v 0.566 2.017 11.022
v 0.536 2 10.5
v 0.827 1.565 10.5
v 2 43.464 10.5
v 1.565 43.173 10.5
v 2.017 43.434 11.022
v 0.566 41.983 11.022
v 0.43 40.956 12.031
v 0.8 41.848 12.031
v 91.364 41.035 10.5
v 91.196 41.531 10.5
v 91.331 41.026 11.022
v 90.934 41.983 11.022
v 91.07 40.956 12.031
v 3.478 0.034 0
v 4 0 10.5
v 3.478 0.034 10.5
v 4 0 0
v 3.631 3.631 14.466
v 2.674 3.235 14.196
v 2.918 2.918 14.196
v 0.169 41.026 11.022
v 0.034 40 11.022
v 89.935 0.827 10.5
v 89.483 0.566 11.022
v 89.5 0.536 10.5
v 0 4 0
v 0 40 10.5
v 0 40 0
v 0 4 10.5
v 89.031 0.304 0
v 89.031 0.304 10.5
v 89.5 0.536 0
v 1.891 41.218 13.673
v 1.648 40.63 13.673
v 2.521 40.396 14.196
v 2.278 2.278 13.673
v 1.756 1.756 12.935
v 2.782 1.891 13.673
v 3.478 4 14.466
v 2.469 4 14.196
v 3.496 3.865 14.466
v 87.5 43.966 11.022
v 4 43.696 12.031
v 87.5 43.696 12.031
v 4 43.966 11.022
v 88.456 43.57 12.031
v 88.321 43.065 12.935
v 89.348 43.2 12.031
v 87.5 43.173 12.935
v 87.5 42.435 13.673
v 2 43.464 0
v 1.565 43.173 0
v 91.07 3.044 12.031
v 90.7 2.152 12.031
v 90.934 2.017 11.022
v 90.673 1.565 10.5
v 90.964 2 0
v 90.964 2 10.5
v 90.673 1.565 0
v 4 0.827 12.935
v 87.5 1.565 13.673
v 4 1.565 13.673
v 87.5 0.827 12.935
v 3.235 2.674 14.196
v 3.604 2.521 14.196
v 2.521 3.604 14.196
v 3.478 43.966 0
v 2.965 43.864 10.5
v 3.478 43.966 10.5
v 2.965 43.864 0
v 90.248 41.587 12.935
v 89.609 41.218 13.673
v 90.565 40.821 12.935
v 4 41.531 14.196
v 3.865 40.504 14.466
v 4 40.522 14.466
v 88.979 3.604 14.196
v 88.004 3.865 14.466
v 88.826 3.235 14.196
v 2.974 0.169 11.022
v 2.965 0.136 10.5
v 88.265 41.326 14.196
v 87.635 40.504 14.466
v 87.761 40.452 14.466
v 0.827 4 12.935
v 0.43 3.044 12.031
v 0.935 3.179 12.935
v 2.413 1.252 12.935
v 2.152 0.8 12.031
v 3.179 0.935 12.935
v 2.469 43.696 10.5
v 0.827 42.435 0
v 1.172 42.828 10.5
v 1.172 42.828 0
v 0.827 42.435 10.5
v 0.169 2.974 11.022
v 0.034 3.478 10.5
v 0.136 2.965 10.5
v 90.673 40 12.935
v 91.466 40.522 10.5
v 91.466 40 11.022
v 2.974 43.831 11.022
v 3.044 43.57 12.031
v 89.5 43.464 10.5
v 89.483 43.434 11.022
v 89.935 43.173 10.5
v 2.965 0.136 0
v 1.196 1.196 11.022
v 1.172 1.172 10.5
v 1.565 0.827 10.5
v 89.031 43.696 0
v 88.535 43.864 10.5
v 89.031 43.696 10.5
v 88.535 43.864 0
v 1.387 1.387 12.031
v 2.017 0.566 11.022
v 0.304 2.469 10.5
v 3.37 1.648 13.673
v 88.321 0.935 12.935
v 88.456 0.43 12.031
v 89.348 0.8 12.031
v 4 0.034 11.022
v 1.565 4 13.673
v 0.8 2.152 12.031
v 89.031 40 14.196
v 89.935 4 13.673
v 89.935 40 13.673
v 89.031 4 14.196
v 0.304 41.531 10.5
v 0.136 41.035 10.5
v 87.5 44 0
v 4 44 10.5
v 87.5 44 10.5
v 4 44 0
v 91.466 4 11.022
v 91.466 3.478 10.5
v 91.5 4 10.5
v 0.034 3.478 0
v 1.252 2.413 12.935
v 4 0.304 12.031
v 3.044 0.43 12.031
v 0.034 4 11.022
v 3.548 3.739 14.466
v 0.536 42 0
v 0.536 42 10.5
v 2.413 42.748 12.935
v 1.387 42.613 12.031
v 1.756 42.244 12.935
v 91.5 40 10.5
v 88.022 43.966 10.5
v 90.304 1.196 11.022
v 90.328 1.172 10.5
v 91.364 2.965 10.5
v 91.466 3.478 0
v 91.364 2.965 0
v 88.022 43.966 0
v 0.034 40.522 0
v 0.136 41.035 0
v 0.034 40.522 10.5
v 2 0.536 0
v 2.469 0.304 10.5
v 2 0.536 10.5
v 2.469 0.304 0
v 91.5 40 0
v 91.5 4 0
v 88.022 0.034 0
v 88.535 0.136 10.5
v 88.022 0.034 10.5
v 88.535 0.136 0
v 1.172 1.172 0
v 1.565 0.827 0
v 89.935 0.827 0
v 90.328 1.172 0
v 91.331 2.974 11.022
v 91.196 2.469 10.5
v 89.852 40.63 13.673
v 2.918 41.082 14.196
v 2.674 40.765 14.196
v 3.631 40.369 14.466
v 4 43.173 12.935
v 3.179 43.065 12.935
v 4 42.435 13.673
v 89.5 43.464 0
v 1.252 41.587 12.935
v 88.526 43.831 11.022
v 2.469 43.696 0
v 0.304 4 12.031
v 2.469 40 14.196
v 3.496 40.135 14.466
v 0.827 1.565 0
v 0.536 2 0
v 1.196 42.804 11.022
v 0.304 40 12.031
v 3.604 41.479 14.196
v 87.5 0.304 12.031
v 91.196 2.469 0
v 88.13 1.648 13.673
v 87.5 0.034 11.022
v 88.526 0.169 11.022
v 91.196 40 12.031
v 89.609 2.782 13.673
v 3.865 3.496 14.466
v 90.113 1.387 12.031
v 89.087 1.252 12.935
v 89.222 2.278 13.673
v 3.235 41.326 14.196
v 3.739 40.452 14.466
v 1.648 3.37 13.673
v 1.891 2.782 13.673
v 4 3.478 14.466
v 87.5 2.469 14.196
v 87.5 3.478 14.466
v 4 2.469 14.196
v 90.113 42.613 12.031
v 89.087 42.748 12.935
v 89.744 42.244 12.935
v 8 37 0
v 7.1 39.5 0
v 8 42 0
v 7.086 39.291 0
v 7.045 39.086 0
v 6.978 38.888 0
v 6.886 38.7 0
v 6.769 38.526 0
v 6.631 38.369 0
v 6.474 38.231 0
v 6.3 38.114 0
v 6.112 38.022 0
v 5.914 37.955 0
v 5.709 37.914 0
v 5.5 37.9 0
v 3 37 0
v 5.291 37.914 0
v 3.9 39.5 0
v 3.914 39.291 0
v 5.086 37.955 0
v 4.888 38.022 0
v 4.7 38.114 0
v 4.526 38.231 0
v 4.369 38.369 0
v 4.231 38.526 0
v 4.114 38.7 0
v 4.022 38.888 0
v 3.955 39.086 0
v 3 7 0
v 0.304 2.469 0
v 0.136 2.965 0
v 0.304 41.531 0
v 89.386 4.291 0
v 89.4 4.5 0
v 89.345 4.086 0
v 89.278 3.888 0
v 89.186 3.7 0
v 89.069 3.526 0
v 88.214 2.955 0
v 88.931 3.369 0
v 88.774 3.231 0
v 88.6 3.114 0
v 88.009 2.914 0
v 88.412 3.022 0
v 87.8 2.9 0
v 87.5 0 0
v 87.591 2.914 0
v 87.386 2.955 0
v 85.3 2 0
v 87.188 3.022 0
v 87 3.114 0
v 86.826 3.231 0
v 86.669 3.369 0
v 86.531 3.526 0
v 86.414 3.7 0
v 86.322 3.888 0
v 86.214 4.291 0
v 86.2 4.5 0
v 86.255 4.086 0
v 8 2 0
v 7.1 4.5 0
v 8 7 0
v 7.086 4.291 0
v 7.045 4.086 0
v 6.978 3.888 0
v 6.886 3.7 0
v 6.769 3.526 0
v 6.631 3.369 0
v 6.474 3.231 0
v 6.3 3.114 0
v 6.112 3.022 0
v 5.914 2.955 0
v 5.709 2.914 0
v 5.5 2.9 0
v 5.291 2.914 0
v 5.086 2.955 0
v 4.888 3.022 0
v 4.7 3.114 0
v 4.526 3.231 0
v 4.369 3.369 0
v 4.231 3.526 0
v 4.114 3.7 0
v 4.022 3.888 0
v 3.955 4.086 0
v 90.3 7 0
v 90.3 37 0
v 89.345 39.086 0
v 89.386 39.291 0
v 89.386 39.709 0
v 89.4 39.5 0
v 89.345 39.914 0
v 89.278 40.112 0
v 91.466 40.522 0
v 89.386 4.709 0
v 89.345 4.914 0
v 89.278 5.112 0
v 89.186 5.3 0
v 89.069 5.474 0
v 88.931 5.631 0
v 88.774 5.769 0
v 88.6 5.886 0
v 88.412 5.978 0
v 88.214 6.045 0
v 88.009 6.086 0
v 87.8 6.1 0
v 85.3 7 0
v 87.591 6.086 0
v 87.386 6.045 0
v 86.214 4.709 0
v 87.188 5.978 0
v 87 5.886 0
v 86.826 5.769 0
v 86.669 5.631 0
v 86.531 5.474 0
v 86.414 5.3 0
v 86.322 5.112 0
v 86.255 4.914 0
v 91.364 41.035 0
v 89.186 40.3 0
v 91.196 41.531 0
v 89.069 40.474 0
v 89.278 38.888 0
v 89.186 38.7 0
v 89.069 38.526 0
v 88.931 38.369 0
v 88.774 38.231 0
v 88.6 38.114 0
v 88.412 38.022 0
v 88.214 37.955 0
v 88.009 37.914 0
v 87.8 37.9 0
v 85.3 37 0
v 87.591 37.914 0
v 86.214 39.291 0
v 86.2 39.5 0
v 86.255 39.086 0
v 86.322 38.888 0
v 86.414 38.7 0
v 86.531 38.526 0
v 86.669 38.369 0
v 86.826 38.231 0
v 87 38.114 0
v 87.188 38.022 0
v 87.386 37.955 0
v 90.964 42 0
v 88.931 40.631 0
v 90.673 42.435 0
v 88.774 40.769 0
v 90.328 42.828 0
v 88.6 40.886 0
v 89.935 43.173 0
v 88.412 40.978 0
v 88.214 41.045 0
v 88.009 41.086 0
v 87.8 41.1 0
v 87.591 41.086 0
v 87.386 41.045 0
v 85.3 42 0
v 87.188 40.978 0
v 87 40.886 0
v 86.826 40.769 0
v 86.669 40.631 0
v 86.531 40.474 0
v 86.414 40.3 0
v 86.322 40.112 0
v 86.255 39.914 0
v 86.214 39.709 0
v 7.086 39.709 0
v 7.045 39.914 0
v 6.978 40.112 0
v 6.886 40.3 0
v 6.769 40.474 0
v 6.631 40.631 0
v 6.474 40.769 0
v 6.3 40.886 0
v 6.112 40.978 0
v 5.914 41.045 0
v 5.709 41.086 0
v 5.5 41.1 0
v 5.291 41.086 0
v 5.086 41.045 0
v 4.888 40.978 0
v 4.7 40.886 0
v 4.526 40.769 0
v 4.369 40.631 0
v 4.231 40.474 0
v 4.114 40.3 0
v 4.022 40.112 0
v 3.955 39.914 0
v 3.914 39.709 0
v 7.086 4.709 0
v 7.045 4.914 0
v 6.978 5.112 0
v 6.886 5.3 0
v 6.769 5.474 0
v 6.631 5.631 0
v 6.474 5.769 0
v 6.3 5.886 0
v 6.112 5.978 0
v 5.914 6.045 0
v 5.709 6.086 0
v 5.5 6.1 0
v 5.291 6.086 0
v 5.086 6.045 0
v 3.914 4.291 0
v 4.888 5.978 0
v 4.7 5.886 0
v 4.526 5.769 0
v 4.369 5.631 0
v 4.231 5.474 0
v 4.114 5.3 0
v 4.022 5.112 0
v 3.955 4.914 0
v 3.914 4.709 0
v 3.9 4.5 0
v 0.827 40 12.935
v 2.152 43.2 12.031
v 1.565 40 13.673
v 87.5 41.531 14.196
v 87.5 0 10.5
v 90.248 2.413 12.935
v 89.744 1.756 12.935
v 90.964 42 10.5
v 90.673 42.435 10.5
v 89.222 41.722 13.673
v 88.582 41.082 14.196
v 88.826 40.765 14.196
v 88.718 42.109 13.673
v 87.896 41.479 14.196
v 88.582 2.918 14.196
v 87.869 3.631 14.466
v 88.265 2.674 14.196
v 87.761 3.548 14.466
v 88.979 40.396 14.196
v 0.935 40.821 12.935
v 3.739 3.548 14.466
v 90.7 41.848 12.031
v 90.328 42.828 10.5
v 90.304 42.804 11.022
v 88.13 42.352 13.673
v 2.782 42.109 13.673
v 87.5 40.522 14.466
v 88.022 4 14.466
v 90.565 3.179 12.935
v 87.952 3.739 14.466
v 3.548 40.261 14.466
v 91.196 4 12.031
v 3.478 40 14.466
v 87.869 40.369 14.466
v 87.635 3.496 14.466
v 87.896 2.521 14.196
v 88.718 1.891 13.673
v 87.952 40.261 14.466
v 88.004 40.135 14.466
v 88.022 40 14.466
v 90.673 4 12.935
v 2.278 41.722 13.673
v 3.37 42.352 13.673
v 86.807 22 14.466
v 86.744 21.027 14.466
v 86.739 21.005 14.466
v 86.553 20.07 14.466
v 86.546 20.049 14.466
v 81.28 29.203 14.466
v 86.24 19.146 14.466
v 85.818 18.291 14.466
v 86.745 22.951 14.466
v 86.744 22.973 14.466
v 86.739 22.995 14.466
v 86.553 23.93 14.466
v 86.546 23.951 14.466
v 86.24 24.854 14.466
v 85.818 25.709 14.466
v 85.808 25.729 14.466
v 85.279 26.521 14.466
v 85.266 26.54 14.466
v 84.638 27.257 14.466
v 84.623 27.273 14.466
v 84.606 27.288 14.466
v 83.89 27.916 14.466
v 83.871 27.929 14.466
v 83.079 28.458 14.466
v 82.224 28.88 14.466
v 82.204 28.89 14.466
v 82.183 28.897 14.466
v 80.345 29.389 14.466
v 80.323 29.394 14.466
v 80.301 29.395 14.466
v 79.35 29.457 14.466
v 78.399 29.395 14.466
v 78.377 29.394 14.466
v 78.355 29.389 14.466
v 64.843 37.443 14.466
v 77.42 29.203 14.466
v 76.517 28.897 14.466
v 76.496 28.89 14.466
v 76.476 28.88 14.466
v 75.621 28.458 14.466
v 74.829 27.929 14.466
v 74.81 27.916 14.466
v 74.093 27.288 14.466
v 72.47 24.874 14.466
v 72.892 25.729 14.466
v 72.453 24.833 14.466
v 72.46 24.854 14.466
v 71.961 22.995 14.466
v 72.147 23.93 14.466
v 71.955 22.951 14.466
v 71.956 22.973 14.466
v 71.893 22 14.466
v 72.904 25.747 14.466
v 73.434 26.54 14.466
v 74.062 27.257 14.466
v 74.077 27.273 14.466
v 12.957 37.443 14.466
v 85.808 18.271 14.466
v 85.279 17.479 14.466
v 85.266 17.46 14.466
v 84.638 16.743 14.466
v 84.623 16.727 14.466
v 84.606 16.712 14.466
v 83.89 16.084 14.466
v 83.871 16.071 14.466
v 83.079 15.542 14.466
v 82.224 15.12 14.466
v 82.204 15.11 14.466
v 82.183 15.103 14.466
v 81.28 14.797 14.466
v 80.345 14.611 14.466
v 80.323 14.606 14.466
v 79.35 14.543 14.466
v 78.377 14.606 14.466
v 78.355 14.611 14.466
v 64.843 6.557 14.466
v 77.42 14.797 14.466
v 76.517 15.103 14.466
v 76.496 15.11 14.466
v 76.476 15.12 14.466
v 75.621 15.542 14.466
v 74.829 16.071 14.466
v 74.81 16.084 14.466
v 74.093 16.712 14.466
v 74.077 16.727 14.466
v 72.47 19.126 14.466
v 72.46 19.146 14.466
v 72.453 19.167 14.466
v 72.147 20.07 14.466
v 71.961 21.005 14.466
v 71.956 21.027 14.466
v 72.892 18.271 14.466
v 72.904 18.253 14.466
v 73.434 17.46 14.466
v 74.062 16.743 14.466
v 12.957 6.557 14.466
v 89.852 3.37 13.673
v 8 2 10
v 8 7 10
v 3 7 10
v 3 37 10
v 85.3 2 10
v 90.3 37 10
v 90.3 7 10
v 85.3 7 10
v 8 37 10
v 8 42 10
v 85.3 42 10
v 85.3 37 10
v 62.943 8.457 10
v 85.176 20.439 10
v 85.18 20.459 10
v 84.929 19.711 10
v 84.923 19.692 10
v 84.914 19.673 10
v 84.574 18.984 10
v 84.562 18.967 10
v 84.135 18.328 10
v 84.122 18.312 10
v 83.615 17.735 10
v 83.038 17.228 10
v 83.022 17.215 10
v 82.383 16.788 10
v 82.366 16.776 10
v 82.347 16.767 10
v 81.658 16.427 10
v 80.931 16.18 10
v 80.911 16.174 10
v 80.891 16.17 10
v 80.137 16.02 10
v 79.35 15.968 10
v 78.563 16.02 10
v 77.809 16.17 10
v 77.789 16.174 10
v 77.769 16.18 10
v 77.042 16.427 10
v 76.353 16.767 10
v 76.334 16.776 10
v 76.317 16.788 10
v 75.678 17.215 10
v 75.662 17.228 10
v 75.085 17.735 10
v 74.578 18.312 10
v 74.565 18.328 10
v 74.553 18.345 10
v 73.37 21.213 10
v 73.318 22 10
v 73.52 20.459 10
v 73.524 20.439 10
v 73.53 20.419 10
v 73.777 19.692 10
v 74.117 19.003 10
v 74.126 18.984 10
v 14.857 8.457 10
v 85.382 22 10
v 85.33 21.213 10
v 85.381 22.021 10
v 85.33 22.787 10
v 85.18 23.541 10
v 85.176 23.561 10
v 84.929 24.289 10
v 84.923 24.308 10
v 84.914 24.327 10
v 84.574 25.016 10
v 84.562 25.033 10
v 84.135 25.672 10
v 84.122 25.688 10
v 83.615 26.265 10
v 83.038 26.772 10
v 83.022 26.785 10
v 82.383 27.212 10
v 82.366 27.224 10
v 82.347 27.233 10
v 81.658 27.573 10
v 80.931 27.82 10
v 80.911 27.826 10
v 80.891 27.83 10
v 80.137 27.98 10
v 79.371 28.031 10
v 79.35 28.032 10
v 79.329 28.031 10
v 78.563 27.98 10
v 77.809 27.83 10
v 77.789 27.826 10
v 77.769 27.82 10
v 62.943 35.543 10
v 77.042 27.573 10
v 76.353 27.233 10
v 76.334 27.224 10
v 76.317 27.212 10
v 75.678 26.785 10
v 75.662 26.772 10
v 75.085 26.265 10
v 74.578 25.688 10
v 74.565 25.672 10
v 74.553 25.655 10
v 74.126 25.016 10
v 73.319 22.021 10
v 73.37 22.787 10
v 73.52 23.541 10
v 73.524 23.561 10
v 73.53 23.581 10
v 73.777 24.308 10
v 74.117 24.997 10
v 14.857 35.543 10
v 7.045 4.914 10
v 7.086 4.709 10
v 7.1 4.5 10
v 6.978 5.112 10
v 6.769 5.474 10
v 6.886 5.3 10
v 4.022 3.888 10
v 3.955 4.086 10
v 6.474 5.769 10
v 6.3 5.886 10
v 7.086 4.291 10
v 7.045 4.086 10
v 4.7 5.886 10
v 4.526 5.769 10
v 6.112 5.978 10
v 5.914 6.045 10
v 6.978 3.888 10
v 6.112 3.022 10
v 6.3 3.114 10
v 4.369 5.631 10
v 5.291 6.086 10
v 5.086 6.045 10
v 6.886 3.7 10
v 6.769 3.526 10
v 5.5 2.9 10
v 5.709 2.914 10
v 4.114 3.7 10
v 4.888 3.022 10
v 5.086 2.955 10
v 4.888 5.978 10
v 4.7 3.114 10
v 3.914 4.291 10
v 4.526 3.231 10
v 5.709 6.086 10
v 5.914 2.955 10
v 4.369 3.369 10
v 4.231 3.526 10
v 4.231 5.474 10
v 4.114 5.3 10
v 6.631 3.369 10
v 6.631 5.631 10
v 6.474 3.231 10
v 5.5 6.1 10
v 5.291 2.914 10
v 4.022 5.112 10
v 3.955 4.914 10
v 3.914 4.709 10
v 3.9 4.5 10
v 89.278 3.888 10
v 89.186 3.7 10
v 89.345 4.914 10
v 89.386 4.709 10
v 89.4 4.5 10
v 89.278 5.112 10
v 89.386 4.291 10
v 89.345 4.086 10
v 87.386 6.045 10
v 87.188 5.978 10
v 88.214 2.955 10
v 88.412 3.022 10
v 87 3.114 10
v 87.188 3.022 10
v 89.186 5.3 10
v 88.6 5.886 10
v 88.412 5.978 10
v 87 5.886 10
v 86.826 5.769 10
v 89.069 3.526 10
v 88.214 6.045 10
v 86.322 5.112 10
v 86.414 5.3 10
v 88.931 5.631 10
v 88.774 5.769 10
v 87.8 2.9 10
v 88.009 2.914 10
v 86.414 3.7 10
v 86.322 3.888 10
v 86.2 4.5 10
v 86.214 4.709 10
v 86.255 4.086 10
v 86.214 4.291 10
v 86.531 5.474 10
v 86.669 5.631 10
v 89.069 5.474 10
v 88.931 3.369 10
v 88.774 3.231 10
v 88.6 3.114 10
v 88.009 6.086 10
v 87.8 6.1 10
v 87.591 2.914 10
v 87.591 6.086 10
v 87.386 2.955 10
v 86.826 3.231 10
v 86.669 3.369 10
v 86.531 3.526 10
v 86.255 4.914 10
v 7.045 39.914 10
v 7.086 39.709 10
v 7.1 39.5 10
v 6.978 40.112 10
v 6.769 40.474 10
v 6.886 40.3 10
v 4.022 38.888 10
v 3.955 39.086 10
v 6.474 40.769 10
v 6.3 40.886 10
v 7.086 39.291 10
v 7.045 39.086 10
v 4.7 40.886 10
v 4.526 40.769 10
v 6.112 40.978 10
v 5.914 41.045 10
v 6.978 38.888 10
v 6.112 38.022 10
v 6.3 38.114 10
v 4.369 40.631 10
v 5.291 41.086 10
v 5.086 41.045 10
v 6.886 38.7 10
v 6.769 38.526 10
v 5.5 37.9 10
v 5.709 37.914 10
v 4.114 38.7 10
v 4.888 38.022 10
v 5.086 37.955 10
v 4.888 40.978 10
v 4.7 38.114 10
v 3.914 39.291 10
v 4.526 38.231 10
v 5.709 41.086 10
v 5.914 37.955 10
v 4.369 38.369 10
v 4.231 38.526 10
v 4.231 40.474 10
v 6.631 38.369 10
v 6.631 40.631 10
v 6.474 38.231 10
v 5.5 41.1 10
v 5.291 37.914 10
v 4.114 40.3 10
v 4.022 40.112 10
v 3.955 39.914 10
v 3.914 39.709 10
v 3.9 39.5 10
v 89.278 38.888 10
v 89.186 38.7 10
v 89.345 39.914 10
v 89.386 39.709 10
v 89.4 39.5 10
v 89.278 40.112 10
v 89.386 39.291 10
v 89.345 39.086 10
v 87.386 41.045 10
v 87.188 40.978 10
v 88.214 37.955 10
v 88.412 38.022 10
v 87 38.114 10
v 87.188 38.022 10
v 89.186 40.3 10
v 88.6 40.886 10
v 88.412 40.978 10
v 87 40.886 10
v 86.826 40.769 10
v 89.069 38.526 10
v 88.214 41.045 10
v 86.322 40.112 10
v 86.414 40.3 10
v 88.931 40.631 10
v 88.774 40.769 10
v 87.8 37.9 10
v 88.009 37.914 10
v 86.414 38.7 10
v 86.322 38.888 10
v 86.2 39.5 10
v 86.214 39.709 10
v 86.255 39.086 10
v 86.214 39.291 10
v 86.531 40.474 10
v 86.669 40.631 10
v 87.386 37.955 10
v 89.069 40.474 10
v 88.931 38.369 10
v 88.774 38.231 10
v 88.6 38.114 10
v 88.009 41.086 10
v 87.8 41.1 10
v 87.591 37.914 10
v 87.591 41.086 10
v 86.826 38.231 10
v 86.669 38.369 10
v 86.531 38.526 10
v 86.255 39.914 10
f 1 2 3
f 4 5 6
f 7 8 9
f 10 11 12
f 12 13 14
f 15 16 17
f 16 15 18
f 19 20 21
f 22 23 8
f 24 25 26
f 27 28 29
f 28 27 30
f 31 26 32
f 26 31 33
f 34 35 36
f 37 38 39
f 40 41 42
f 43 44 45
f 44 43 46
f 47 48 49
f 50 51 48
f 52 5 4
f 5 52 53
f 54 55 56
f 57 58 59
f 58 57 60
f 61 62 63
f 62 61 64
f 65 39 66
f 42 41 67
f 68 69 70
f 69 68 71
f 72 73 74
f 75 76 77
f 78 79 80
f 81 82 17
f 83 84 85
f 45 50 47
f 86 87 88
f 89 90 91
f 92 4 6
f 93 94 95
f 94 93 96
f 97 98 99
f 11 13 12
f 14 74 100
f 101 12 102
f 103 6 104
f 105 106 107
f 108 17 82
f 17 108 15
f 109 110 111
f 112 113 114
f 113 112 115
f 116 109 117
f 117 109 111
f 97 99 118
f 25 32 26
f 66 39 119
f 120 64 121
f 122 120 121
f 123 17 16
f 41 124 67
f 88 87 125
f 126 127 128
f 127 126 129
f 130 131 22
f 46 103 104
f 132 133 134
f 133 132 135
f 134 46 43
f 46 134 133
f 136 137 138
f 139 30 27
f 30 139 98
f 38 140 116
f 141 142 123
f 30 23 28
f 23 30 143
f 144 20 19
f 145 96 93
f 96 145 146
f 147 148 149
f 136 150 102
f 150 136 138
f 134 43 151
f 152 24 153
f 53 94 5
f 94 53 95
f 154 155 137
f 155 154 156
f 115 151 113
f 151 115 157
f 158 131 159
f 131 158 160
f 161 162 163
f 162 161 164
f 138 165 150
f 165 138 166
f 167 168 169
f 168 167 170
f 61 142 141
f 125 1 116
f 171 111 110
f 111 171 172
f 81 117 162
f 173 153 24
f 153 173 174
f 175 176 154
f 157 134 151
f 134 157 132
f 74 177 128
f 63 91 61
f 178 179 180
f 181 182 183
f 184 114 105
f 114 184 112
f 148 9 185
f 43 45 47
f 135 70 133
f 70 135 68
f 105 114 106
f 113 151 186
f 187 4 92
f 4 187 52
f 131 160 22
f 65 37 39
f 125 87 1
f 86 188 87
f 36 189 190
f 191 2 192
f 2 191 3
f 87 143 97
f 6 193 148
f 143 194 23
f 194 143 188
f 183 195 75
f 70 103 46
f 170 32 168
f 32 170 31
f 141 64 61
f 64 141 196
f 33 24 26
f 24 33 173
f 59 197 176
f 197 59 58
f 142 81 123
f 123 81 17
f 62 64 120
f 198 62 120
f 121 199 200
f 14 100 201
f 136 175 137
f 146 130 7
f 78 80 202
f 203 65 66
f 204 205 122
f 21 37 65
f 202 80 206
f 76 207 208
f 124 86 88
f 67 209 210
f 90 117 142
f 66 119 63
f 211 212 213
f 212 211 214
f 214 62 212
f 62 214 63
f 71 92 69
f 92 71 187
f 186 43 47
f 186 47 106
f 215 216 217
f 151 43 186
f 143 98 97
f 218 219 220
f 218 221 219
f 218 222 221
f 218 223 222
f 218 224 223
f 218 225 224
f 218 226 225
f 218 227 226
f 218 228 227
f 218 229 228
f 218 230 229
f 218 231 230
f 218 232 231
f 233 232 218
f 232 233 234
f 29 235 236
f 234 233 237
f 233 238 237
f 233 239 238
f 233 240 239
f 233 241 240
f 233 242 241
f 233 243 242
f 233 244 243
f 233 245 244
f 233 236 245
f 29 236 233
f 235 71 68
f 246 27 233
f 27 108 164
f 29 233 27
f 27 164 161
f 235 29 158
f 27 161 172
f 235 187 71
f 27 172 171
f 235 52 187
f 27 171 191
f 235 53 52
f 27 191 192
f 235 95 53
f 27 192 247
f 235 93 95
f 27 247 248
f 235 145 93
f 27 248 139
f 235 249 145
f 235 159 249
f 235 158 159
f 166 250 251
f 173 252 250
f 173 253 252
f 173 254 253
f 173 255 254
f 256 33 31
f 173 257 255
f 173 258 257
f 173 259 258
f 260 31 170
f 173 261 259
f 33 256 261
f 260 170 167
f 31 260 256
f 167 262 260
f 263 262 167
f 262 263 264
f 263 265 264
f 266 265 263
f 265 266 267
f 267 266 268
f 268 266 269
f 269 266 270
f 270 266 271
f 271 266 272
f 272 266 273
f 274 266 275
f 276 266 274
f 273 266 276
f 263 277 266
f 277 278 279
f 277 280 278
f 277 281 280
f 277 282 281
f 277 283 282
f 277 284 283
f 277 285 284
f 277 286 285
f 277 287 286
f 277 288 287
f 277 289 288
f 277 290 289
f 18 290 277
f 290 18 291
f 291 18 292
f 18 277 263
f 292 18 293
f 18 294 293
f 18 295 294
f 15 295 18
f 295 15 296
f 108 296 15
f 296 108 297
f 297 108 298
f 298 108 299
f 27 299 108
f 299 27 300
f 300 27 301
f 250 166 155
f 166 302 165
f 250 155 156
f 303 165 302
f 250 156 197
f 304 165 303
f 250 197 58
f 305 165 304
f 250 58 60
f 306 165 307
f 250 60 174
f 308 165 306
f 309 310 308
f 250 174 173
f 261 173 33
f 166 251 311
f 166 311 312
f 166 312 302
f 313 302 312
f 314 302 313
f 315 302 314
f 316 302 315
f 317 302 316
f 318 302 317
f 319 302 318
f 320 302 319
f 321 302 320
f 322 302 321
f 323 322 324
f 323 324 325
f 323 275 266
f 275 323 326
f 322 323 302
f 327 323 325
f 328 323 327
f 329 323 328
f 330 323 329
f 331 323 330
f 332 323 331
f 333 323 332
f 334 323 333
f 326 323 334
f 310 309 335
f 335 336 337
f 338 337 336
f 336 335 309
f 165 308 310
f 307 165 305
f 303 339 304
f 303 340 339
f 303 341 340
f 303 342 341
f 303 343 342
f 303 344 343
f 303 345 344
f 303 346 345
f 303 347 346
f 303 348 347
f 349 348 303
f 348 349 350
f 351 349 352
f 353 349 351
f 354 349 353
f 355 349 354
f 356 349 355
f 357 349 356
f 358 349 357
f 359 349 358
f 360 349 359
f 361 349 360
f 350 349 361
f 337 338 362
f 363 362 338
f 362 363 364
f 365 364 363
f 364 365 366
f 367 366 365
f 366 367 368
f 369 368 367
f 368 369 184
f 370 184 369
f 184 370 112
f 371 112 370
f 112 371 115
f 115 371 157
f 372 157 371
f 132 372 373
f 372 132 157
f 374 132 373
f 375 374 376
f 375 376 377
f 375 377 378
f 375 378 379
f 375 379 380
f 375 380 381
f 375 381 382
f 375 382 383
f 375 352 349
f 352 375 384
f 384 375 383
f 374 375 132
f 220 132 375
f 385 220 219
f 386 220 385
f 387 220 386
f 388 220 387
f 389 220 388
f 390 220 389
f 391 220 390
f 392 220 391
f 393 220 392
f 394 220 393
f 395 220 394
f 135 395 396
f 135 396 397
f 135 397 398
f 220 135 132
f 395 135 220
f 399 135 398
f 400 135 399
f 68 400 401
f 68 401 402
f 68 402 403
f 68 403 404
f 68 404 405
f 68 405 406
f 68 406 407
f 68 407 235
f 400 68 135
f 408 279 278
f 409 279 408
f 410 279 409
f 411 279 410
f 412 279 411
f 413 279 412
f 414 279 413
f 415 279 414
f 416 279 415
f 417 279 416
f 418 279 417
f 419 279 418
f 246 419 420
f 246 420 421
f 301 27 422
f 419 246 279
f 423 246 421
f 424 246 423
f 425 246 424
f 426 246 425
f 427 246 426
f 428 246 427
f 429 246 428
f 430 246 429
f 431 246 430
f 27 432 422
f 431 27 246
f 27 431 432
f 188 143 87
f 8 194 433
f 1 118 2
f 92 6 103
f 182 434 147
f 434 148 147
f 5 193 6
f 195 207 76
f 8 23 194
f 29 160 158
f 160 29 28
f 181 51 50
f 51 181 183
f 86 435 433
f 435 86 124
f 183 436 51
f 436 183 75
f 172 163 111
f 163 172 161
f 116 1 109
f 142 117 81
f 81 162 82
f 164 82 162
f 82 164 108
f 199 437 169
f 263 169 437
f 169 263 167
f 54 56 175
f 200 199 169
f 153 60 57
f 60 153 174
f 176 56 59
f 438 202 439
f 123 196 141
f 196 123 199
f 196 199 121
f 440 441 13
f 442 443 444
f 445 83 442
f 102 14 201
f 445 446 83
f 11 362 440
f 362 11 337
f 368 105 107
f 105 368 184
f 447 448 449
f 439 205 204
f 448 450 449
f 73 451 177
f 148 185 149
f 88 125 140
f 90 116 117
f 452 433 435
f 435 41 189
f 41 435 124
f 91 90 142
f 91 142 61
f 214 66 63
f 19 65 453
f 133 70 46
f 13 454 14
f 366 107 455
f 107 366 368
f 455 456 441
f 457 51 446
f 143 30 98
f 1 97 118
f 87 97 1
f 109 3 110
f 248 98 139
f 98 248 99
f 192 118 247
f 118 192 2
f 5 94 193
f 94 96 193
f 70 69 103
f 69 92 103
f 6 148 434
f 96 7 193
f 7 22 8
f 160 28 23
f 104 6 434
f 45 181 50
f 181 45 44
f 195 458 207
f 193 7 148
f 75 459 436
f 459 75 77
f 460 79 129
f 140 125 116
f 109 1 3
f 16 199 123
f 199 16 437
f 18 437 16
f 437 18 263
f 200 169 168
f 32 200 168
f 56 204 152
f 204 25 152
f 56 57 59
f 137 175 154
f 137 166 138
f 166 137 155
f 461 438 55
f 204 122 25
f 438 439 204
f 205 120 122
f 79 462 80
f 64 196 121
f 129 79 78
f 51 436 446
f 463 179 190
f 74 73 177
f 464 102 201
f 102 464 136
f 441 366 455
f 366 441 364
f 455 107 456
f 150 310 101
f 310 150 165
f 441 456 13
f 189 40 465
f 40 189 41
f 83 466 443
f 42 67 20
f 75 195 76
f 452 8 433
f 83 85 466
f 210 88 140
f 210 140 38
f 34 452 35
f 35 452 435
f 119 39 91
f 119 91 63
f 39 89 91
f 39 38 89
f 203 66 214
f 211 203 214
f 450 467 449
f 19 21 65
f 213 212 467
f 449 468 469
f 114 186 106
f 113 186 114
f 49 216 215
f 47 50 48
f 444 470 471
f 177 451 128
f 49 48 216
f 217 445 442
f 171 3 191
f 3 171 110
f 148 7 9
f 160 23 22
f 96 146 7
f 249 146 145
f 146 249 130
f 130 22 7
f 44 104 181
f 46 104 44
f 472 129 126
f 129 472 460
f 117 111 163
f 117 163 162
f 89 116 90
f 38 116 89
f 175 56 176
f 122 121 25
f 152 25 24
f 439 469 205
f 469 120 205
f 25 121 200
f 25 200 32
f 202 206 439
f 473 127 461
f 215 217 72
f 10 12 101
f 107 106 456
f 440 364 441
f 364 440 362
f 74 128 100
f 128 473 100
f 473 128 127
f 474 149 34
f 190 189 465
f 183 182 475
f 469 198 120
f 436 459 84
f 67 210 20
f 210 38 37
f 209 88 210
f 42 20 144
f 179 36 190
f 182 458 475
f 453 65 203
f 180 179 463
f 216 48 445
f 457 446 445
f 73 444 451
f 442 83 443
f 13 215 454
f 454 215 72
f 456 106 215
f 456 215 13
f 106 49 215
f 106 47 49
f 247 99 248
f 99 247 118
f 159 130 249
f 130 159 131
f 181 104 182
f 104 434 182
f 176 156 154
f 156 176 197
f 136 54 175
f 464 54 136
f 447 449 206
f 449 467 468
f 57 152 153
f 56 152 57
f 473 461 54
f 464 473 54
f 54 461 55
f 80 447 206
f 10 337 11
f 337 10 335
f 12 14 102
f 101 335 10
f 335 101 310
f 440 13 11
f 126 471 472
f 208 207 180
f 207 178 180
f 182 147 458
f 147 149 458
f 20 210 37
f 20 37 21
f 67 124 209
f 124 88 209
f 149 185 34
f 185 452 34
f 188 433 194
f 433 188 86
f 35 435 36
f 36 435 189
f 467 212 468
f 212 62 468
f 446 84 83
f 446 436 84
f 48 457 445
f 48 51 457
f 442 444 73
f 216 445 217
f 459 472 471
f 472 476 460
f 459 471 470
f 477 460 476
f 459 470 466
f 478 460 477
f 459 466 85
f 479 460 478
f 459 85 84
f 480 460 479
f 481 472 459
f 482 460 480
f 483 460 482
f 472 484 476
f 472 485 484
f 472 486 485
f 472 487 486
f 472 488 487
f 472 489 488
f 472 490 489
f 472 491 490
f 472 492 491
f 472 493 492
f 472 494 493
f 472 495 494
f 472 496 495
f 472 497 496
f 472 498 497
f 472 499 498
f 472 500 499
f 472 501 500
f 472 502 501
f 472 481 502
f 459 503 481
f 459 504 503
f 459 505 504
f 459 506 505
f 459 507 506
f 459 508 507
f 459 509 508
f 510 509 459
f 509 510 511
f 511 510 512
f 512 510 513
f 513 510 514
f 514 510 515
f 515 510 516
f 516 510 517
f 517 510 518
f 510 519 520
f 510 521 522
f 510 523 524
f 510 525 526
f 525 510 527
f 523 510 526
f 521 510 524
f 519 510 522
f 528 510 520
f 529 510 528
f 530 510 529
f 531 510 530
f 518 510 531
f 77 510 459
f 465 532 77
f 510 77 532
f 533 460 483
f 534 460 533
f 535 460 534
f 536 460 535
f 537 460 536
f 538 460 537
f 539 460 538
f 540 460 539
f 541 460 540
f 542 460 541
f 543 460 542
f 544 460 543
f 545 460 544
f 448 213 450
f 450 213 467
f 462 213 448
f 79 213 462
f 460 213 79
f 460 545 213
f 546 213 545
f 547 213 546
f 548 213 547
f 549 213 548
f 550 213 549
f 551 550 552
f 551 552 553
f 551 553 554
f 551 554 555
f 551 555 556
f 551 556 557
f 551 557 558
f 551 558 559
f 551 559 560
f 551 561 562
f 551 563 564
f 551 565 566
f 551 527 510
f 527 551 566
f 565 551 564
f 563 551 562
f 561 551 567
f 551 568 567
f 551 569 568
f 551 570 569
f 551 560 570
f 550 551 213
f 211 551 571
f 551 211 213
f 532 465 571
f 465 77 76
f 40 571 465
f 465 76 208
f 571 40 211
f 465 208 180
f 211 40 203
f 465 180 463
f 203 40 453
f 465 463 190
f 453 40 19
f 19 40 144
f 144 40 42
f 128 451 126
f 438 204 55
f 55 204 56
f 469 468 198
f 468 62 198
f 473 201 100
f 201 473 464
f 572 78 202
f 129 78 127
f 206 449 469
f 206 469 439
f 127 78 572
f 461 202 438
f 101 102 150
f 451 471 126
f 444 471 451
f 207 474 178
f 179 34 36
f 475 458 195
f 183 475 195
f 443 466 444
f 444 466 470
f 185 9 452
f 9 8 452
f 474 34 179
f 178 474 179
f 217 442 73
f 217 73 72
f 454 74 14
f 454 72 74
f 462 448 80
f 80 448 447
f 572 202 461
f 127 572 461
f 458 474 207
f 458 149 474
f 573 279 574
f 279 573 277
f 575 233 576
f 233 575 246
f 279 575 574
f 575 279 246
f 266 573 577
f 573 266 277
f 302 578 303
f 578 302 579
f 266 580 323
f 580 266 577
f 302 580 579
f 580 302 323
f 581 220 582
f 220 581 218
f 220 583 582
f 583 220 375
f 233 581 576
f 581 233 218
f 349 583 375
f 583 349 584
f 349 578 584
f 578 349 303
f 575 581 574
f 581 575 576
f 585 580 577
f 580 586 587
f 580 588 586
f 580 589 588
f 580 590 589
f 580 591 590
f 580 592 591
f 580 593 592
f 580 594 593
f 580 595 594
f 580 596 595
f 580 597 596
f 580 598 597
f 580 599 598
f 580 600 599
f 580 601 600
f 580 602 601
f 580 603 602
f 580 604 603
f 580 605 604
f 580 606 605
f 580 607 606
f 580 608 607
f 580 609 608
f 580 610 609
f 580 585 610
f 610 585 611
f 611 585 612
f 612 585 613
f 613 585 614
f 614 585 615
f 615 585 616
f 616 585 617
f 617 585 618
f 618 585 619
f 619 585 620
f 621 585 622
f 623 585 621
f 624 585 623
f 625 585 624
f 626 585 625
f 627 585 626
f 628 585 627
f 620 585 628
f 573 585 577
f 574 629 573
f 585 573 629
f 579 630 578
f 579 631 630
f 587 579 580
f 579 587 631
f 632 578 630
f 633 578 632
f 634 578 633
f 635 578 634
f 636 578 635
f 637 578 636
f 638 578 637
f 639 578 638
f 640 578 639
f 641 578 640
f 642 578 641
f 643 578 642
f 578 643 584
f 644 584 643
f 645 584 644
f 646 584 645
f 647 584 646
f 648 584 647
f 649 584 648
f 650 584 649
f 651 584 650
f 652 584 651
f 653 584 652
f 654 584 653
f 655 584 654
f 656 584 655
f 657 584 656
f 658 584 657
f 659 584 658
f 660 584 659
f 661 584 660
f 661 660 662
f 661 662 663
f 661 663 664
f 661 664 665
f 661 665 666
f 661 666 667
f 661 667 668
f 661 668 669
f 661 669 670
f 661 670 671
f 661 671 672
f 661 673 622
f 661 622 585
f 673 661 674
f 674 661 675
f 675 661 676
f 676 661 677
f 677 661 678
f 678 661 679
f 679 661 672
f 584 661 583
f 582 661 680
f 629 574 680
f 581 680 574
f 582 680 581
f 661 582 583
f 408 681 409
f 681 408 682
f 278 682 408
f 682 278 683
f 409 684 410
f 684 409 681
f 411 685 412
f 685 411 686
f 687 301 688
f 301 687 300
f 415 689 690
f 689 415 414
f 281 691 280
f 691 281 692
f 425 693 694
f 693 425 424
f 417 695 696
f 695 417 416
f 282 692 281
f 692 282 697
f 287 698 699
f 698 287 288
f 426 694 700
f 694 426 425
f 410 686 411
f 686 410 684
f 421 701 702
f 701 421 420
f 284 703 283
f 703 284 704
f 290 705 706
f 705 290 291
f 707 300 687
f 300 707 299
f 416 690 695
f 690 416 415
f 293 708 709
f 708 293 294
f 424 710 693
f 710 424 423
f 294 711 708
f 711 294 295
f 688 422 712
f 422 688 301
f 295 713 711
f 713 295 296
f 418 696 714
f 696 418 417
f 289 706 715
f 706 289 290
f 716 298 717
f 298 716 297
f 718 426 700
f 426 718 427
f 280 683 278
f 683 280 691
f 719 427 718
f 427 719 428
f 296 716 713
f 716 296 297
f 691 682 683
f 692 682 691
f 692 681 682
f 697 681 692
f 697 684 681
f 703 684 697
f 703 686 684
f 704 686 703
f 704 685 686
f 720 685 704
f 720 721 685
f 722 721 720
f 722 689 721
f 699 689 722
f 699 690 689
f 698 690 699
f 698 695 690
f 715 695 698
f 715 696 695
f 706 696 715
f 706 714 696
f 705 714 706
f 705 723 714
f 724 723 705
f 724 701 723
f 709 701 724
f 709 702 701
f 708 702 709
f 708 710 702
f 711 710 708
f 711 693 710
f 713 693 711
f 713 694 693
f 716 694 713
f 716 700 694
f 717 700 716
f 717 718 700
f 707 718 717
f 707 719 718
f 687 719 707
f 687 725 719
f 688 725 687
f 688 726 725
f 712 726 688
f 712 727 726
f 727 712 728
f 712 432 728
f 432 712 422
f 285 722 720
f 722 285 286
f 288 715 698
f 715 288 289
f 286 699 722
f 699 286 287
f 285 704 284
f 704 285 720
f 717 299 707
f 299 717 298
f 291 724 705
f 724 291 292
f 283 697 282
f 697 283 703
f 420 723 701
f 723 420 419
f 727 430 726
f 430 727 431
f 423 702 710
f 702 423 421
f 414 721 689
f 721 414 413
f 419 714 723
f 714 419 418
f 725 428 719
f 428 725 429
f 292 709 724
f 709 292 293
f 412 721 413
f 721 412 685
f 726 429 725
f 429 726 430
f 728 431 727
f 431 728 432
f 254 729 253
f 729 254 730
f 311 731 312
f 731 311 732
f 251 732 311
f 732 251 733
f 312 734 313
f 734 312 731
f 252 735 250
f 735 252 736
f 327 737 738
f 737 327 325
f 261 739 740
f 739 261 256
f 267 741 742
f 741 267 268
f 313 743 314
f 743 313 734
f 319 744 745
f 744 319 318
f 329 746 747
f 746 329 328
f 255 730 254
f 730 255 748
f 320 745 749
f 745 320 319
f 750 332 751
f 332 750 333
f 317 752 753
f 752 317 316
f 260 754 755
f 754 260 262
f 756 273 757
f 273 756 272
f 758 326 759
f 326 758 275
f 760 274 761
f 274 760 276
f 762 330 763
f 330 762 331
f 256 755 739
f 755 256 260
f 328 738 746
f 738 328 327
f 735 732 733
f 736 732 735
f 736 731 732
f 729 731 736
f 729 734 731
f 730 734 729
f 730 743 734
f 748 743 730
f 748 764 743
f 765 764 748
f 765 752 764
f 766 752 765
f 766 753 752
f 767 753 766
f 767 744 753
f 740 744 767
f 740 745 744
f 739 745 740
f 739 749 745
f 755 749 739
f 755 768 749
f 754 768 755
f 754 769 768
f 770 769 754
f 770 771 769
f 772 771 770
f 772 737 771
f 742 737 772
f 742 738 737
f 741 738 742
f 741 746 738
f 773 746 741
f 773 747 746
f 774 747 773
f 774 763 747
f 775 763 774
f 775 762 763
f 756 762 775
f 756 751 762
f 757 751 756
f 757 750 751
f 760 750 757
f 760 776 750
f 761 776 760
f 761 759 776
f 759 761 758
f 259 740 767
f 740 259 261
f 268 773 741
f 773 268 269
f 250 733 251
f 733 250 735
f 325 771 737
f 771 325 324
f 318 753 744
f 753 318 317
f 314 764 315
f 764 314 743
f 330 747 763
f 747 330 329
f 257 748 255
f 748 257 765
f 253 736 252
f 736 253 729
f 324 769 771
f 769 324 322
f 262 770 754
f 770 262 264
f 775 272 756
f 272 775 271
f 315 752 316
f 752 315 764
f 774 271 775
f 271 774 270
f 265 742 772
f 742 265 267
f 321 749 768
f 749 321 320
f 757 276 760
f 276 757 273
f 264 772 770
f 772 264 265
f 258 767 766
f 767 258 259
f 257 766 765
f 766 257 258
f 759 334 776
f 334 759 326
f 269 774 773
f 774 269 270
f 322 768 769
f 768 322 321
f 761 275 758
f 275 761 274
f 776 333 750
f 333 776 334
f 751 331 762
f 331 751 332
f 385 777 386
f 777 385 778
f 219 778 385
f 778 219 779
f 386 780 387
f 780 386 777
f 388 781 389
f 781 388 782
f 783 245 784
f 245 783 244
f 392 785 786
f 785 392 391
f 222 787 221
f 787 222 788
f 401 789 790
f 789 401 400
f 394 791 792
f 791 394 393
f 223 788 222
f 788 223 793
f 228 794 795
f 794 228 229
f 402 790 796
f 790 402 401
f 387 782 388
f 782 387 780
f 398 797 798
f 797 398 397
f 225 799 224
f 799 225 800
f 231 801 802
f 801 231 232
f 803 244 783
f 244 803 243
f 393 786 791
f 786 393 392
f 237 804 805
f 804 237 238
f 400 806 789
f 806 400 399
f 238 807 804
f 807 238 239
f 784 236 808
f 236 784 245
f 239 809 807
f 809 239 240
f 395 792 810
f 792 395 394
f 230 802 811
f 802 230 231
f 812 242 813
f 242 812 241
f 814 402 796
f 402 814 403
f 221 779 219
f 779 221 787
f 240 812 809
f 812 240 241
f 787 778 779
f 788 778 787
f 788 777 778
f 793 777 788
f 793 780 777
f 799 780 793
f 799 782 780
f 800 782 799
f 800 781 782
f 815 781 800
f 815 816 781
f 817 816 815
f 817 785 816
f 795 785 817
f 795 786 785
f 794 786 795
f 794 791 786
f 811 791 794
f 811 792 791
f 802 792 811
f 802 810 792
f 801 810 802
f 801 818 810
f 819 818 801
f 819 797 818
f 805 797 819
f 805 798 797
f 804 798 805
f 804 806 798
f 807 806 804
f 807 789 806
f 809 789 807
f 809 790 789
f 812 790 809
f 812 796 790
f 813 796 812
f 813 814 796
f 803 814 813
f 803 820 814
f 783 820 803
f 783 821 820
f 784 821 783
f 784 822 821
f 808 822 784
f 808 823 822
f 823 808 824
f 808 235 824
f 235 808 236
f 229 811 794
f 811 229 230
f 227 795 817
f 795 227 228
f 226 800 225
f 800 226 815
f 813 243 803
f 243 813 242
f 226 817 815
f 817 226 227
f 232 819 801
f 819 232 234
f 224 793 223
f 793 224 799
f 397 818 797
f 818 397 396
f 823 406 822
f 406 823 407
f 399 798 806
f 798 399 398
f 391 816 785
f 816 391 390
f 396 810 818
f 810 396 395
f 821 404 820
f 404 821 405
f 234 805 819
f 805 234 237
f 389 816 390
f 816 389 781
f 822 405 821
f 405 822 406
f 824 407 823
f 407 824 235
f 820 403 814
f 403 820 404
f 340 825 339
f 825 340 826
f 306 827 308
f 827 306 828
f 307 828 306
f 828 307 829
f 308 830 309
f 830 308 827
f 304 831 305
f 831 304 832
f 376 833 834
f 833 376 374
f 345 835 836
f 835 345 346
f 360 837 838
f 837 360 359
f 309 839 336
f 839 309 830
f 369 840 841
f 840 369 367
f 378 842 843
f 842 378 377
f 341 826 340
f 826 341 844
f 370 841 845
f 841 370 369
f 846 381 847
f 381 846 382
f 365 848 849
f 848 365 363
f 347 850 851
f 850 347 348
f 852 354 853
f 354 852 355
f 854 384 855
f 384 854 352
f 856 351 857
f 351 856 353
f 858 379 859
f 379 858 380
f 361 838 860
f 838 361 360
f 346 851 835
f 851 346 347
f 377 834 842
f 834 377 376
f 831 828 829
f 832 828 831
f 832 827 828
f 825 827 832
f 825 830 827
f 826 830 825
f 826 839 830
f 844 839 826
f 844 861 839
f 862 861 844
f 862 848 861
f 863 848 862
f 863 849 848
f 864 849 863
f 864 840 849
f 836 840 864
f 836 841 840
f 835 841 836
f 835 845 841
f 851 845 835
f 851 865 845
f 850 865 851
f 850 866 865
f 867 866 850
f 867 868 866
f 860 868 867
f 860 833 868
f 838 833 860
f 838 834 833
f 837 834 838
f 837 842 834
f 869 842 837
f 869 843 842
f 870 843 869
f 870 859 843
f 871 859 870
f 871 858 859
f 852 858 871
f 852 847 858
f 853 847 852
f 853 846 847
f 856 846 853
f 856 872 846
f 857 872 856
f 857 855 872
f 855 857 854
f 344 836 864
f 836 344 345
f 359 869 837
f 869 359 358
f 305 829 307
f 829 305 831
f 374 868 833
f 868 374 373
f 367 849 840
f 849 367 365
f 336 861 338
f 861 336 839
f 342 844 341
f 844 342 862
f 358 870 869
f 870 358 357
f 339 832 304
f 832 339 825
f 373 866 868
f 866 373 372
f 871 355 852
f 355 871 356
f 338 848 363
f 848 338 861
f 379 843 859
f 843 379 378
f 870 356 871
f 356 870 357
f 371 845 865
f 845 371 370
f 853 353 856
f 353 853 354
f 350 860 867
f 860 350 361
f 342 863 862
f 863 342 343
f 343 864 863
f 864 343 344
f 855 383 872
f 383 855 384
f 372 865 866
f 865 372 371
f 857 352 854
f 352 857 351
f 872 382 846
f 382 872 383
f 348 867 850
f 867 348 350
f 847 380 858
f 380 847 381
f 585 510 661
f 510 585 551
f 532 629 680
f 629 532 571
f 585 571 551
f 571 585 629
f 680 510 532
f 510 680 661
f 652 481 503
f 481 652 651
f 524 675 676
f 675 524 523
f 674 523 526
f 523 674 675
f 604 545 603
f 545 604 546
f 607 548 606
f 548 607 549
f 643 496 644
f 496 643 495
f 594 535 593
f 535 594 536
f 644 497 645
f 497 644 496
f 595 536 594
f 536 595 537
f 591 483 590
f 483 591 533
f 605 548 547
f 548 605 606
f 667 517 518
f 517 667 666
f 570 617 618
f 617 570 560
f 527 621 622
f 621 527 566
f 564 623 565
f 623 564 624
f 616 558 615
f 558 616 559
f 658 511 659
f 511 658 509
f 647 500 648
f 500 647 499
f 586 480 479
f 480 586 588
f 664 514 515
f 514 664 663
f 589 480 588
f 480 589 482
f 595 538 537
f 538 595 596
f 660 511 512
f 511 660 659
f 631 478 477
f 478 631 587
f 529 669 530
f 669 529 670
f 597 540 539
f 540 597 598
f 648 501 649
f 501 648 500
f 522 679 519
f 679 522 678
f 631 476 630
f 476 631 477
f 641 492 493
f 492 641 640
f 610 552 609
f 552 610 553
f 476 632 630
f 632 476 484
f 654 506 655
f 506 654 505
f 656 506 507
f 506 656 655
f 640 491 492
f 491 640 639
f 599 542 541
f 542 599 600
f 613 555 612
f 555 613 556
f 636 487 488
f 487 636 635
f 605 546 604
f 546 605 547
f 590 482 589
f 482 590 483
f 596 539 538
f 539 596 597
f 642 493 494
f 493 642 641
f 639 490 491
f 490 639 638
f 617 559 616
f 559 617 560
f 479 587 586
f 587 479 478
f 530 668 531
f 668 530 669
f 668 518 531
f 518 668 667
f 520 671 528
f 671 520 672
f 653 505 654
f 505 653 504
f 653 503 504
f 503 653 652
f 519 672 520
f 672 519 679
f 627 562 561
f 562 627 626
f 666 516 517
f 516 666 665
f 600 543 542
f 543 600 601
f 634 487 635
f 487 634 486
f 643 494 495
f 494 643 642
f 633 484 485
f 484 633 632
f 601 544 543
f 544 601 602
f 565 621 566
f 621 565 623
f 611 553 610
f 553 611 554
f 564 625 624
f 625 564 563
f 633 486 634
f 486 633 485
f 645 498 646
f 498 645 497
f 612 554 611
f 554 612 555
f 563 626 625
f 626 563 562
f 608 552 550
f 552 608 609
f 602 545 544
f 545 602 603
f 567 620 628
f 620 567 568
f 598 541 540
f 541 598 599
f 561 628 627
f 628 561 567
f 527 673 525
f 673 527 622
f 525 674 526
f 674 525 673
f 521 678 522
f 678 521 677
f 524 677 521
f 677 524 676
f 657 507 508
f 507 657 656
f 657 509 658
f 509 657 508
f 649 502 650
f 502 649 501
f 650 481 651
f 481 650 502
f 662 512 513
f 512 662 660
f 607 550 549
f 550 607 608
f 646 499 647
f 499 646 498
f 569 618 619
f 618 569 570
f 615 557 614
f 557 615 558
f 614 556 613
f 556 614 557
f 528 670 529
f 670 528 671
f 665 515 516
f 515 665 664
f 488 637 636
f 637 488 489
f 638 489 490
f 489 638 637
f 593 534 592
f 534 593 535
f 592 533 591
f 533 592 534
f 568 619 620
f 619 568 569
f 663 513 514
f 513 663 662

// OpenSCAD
// Dilder Rev 2 "extended with joystick" — TOP COVER (windowed) v1
//
// Curved BULLNOSE top face (pattern from top-cover-v3-rounded-top) with
// a display viewing window and a joystick through-hole cut through the
// face plate + bullnose. No internal retention rails or lips — a
// separate retention plate bolting up through the 4 corner pillars is
// responsible for holding the display.
//
// Outer footprint (91.5 × 44) and corner-pillar XY positions match
// base-v1 and middle-platform-v1 so the M3 through-bolts line up through
// the entire stack. All 4 corner pillars run full-height from the cover
// floor up through the face plate.
//
// Display is offset as far -X as possible (over the battery half, which
// is ALSO the half supported from below by middle-platform-v1's solid
// fill pedestal). A separate through-hole punches the face plate on the
// +X half (center of the remaining right-hand region) — intended for a
// joystick shaft / control input above the ESP32 side.
//
// Export:
//   openscad -o top-cover-windowed-v1.3mf top-cover-windowed-v1.scad

$fn = 48;

// ============================================================
// Outer shell (flush with base-v1 and middle-platform-v1)
// ============================================================
enclosure_outer_width_along_x_axis_mm          = 91.5;
enclosure_outer_depth_along_y_axis_mm          = 44;
outer_case_top_view_corner_radius_mm           = 4;   // matches base
// Bigger bullnose = more pronounced curve across the whole front face
// (see sketch IMG20260422215927.jpg — top edge rolls into the top face).
outer_case_top_edge_bullnose_radius_mm         = 4;   // curved TOP edge

// ============================================================
// Asymmetric ±X end walls — match base-v1 so pillar origins align
// ============================================================
minus_x_end_wall_thickness_mm                  = 3.0; // battery end
plus_x_end_wall_thickness_mm                   = 1.2; // USB-C end (thin)
perimeter_long_side_wall_thickness_y_mm_base   = 2;   // base's ±Y wall

// ============================================================
// Cover Z layout (cover-local: z=0 is the cover's mating bottom,
// flush with the middle-platform shell top at stack z = 22)
// ============================================================
// middle-platform-v1's -X solid fill pedestal pokes 5 mm above its
// 8 mm shell top. In cover-local coords that puts the pedestal top at
// z = 5, which is exactly where the display's underside sits — the
// pedestal supports the display's left half from below, while the
// snap lips catch the right half.
middle_platform_pedestal_protrusion_into_cover_z_mm = 5;

display_footprint_thickness_z_mm               = 5;   // Waveshare 2.13"
// Thin face plate — tapers further at the window edge via the chamfered
// window cut below, so the face over the screen reads as a thin bezel.
// Most of the visible "top-face taper" now happens inside the bullnose
// region above this plate; the plate itself is minimum-printable thin.
face_plate_thickness_z_mm                      = 0.5;

display_bottom_z_mm =
    middle_platform_pedestal_protrusion_into_cover_z_mm;      // = 5
display_top_z_mm =
    display_bottom_z_mm + display_footprint_thickness_z_mm;   // = 10
face_plate_bottom_z_mm                         = display_top_z_mm; // = 10, flush against display top
face_plate_top_z_mm =
    face_plate_bottom_z_mm + face_plate_thickness_z_mm;       // = 12
cover_total_height_z_mm =
    face_plate_top_z_mm + outer_case_top_edge_bullnose_radius_mm; // = 14

// ============================================================
// Display footprint — Waveshare 2.13", LANDSCAPE in Rev 2
// ============================================================
// Rev 1 had the display in portrait (30 × 65). For Rev 2 the enclosure
// long axis is X (91.5 mm), so the 65 mm side of the display lies along
// X and the 30 mm side along Y.
display_footprint_length_along_x_mm            = 65;
display_footprint_depth_along_y_mm             = 30;
print_fit_tolerance_slop_mm                    = 0.4;

// "Offset the window as far LEFT as possible" — display's -X edge butts
// against the -X inner wall face with just the print-slop gap.
display_minus_x_origin_mm =
    minus_x_end_wall_thickness_mm
      + print_fit_tolerance_slop_mm;                              // = 3.4
display_plus_x_end_mm =
    display_minus_x_origin_mm + display_footprint_length_along_x_mm; // = 68.4
display_y_centerline_mm =
    enclosure_outer_depth_along_y_axis_mm / 2;                    // = 22
display_minus_y_origin_mm =
    display_y_centerline_mm - display_footprint_depth_along_y_mm / 2; // = 7
display_plus_y_end_mm =
    display_minus_y_origin_mm + display_footprint_depth_along_y_mm;   // = 37

// ============================================================
// Display viewing window cut through the face plate + bullnose
// ============================================================
// Scaled from Rev 1's top-plate-windowed-v1 (25 × 50 opening on a
// 30 × 65 display), reoriented for landscape so the long axis of the
// window lies along X.
// Matched to the Waveshare 2.13" VIEWABLE pixel area (measured against
// the first print, not the glass / bezel). Relative to the 50 × 25
// window on the first print, the -X short side was moved INWARD by
// 2 mm (the shift param is bumped +1 so only the -X edge moves, not
// both), and the ±Y long sides each extend OUTWARD by 1 mm.
display_viewing_window_length_along_x_mm       = 48;  // was 50
display_viewing_window_depth_along_y_mm        = 27;  // was 25
// Nudge the window +X toward the joystick hole from the display-centered
// position. Asymmetric bezel: more material on the -X (battery) side,
// less on the +X (joystick) side. Bumped +1 relative to the first print
// to compensate for the 2 mm length reduction on the -X end so only
// the -X short edge shifts inward (the +X short edge stays at X=62.9).
display_window_shift_toward_joystick_x_mm      = 3;   // was 2
display_window_origin_x_mm =
    display_minus_x_origin_mm
      + (display_footprint_length_along_x_mm
          - display_viewing_window_length_along_x_mm) / 2
      + display_window_shift_toward_joystick_x_mm;
display_window_origin_y_mm =
    display_minus_y_origin_mm
      + (display_footprint_depth_along_y_mm
          - display_viewing_window_depth_along_y_mm) / 2;        // centered on display in Y

// Top-of-window taper: the window opening widens from its true
// (display-matched) size at the face-plate bottom to a larger opening at
// the very top of the cover, so the bullnose + face-plate material visibly
// tapers DOWN into the screen edges (a shallow funnel around the window).
display_window_top_taper_width_mm              = 2.0;

// ============================================================
// Joystick through-hole on the +X half of the face plate
// ============================================================
// Centered in the open region between the display's +X end and the +X
// inner wall face, Y-centered on the enclosure axis. Default 12 mm Ø
// is a reasonable starting point for a thumb-joystick shaft with bezel
// clearance — tune to the real joystick module.
joystick_through_hole_diameter_mm              = 12;
joystick_through_hole_center_x_mm =
    (display_plus_x_end_mm
      + (enclosure_outer_width_along_x_axis_mm
          - plus_x_end_wall_thickness_mm)) / 2;
joystick_through_hole_center_y_mm              = display_y_centerline_mm;
// Chamfer on the joystick hole — matches the window taper language.
// The bore is true diameter at the face-plate bottom and widens by
// `joystick_hole_top_taper_width_mm` on radius at the top of the cover,
// so the bullnose rolls smoothly into the joystick opening instead of
// meeting it at a hard square edge.
joystick_hole_top_taper_width_mm               = 1.5;

// ============================================================
// Corner pillars — identical XY to base-v1 / middle-platform-v1
// ============================================================
corner_pillar_square_side_length_mm            = 5;
corner_pillar_inner_facing_corner_radius_mm    = 1;
m3_screw_clearance_hole_diameter_mm            = 3.2;

corner_pillar_xy_origin_positions_list = [
    [minus_x_end_wall_thickness_mm,
     perimeter_long_side_wall_thickness_y_mm_base],
    [enclosure_outer_width_along_x_axis_mm
       - plus_x_end_wall_thickness_mm
       - corner_pillar_square_side_length_mm,
     perimeter_long_side_wall_thickness_y_mm_base],
    [minus_x_end_wall_thickness_mm,
     enclosure_outer_depth_along_y_axis_mm
       - perimeter_long_side_wall_thickness_y_mm_base
       - corner_pillar_square_side_length_mm],
    [enclosure_outer_width_along_x_axis_mm
       - plus_x_end_wall_thickness_mm
       - corner_pillar_square_side_length_mm,
     enclosure_outer_depth_along_y_axis_mm
       - perimeter_long_side_wall_thickness_y_mm_base
       - corner_pillar_square_side_length_mm],
];


// ========== Helpers (shared shape language with base-v1) ==========

module rounded_v_box(w, l, h, r, fn = 48) {
    hull() {
        for (x = [r, w - r])
            for (y = [r, l - r])
                translate([x, y, 0])
                    cylinder(r = r, h = h, $fn = fn);
    }
}

module pillar_one_round(w, l, h, r, round_x, round_y) {
    tiny = 0.01;
    hull() {
        for (ix = [0, 1])
            for (iy = [0, 1]) {
                cr = (ix == round_x && iy == round_y) ? r : tiny;
                translate([cr + ix * (w - 2*cr), cr + iy * (l - 2*cr), 0])
                    cylinder(r = cr, h = h, $fn = 48);
            }
    }
}

// Rounded-rectangle PRISM with a BULLNOSE top edge — the curved top
// face (lifted from top-cover-v3-rounded-top). Top face is clipped flat
// at `h`, and the transition from the vertical walls to the top face is
// a curve with radius ≈ `top_r`.
module shell_with_bullnose_top(w, l, h, case_r, top_r) {
    intersection() {
        hull() {
            for (x = [case_r, w - case_r])
                for (y = [case_r, l - case_r]) {
                    translate([x, y, 0])
                        cylinder(r = case_r, h = h - top_r, $fn = 48);
                    translate([x, y, h - top_r])
                        sphere(r = case_r, $fn = 24);
                }
        }
        translate([-1, -1, 0])
            cube([w + 2, l + 2, h]);
    }
}

// Cavity carve that preserves the 4 corner pillars (so M3 screw holes
// stay fully embedded in solid pillar material).
module chamber_carve_preserving_pillars(origin_x, origin_y, origin_z,
                                        width_x, depth_y, height_z,
                                        pillar_xy_list, pillar_side) {
    difference() {
        translate([origin_x, origin_y, origin_z])
            cube([width_x, depth_y, height_z]);
        for (pillar_origin_xy = pillar_xy_list)
            translate([pillar_origin_xy[0], pillar_origin_xy[1], origin_z - 0.5])
                cube([pillar_side, pillar_side, height_z + 1]);
    }
}


// ========== Top cover (windowed) ==========

module top_cover_windowed() {
    // Cavity extents (below the face plate, full inner footprint).
    cavity_inner_x_start_mm = minus_x_end_wall_thickness_mm;
    cavity_inner_x_end_mm =
        enclosure_outer_width_along_x_axis_mm
          - plus_x_end_wall_thickness_mm;
    cavity_inner_y_start_mm = perimeter_long_side_wall_thickness_y_mm_base;
    cavity_inner_y_end_mm =
        enclosure_outer_depth_along_y_axis_mm
          - perimeter_long_side_wall_thickness_y_mm_base;

    difference() {
        union() {
            shell_with_bullnose_top(
                enclosure_outer_width_along_x_axis_mm,
                enclosure_outer_depth_along_y_axis_mm,
                cover_total_height_z_mm,
                outer_case_top_view_corner_radius_mm,
                outer_case_top_edge_bullnose_radius_mm);

            // Corner pillars — full-height from cover floor up through
            // the face plate so the M3 clearance bore is embedded in
            // solid material top-to-bottom and the face plate ties into
            // every pillar. Only the inward-facing corner is rounded.
            for (corner_pillar_origin_xy = corner_pillar_xy_origin_positions_list) {
                pillar_rounds_positive_x_corner =
                    (corner_pillar_origin_xy[0]
                      < enclosure_outer_width_along_x_axis_mm / 2) ? 1 : 0;
                pillar_rounds_positive_y_corner =
                    (corner_pillar_origin_xy[1]
                      < enclosure_outer_depth_along_y_axis_mm / 2) ? 1 : 0;
                translate([corner_pillar_origin_xy[0],
                           corner_pillar_origin_xy[1],
                           0])
                    pillar_one_round(
                        corner_pillar_square_side_length_mm,
                        corner_pillar_square_side_length_mm,
                        face_plate_top_z_mm,
                        corner_pillar_inner_facing_corner_radius_mm,
                        pillar_rounds_positive_x_corner,
                        pillar_rounds_positive_y_corner);
            }
        }

        // Hollow interior below the face plate, preserving each corner
        // pillar's full-height column so the M3 bore stays in solid
        // material.
        chamber_carve_preserving_pillars(
            cavity_inner_x_start_mm,
            cavity_inner_y_start_mm,
            -0.1,
            cavity_inner_x_end_mm - cavity_inner_x_start_mm,
            cavity_inner_y_end_mm - cavity_inner_y_start_mm,
            face_plate_bottom_z_mm + 0.1,
            corner_pillar_xy_origin_positions_list,
            corner_pillar_square_side_length_mm);

        // Display viewing window — tapered cut. Face-plate-bottom
        // opening matches the true window size; widens by
        // 2·taper at the top of the cover so the face plate + bullnose
        // read as a shallow funnel around the screen edges.
        hull() {
            translate([display_window_origin_x_mm,
                       display_window_origin_y_mm,
                       face_plate_bottom_z_mm - 0.1])
                cube([display_viewing_window_length_along_x_mm,
                      display_viewing_window_depth_along_y_mm,
                      0.001]);
            translate([display_window_origin_x_mm
                         - display_window_top_taper_width_mm,
                       display_window_origin_y_mm
                         - display_window_top_taper_width_mm,
                       cover_total_height_z_mm + 0.1 - 0.001])
                cube([display_viewing_window_length_along_x_mm
                        + 2 * display_window_top_taper_width_mm,
                      display_viewing_window_depth_along_y_mm
                        + 2 * display_window_top_taper_width_mm,
                      0.001]);
        }

        // Joystick through-hole — tapered cut like the display window.
        translate([joystick_through_hole_center_x_mm,
                   joystick_through_hole_center_y_mm,
                   0])
            hull() {
                translate([0, 0, face_plate_bottom_z_mm - 0.1])
                    cylinder(
                        h = 0.001,
                        d = joystick_through_hole_diameter_mm);
                translate([0, 0,
                           cover_total_height_z_mm + 0.1 - 0.001])
                    cylinder(
                        h = 0.001,
                        d = joystick_through_hole_diameter_mm
                              + 2 * joystick_hole_top_taper_width_mm);
            }

        // BLIND M3 bores — open at the cover's mating bottom, capped
        // at face_plate_bottom_z_mm so the face plate + bullnose above
        // hide the bore from the front view.
        for (corner_pillar_origin_xy = corner_pillar_xy_origin_positions_list) {
            screw_hole_center_x_mm =
                corner_pillar_origin_xy[0]
                  + corner_pillar_square_side_length_mm / 2;
            screw_hole_center_y_mm =
                corner_pillar_origin_xy[1]
                  + corner_pillar_square_side_length_mm / 2;
            translate([screw_hole_center_x_mm,
                       screw_hole_center_y_mm,
                       -0.1])
                cylinder(h = face_plate_bottom_z_mm + 0.1,
                         d = m3_screw_clearance_hole_diameter_mm);
        }
    }
}

top_cover_windowed();
